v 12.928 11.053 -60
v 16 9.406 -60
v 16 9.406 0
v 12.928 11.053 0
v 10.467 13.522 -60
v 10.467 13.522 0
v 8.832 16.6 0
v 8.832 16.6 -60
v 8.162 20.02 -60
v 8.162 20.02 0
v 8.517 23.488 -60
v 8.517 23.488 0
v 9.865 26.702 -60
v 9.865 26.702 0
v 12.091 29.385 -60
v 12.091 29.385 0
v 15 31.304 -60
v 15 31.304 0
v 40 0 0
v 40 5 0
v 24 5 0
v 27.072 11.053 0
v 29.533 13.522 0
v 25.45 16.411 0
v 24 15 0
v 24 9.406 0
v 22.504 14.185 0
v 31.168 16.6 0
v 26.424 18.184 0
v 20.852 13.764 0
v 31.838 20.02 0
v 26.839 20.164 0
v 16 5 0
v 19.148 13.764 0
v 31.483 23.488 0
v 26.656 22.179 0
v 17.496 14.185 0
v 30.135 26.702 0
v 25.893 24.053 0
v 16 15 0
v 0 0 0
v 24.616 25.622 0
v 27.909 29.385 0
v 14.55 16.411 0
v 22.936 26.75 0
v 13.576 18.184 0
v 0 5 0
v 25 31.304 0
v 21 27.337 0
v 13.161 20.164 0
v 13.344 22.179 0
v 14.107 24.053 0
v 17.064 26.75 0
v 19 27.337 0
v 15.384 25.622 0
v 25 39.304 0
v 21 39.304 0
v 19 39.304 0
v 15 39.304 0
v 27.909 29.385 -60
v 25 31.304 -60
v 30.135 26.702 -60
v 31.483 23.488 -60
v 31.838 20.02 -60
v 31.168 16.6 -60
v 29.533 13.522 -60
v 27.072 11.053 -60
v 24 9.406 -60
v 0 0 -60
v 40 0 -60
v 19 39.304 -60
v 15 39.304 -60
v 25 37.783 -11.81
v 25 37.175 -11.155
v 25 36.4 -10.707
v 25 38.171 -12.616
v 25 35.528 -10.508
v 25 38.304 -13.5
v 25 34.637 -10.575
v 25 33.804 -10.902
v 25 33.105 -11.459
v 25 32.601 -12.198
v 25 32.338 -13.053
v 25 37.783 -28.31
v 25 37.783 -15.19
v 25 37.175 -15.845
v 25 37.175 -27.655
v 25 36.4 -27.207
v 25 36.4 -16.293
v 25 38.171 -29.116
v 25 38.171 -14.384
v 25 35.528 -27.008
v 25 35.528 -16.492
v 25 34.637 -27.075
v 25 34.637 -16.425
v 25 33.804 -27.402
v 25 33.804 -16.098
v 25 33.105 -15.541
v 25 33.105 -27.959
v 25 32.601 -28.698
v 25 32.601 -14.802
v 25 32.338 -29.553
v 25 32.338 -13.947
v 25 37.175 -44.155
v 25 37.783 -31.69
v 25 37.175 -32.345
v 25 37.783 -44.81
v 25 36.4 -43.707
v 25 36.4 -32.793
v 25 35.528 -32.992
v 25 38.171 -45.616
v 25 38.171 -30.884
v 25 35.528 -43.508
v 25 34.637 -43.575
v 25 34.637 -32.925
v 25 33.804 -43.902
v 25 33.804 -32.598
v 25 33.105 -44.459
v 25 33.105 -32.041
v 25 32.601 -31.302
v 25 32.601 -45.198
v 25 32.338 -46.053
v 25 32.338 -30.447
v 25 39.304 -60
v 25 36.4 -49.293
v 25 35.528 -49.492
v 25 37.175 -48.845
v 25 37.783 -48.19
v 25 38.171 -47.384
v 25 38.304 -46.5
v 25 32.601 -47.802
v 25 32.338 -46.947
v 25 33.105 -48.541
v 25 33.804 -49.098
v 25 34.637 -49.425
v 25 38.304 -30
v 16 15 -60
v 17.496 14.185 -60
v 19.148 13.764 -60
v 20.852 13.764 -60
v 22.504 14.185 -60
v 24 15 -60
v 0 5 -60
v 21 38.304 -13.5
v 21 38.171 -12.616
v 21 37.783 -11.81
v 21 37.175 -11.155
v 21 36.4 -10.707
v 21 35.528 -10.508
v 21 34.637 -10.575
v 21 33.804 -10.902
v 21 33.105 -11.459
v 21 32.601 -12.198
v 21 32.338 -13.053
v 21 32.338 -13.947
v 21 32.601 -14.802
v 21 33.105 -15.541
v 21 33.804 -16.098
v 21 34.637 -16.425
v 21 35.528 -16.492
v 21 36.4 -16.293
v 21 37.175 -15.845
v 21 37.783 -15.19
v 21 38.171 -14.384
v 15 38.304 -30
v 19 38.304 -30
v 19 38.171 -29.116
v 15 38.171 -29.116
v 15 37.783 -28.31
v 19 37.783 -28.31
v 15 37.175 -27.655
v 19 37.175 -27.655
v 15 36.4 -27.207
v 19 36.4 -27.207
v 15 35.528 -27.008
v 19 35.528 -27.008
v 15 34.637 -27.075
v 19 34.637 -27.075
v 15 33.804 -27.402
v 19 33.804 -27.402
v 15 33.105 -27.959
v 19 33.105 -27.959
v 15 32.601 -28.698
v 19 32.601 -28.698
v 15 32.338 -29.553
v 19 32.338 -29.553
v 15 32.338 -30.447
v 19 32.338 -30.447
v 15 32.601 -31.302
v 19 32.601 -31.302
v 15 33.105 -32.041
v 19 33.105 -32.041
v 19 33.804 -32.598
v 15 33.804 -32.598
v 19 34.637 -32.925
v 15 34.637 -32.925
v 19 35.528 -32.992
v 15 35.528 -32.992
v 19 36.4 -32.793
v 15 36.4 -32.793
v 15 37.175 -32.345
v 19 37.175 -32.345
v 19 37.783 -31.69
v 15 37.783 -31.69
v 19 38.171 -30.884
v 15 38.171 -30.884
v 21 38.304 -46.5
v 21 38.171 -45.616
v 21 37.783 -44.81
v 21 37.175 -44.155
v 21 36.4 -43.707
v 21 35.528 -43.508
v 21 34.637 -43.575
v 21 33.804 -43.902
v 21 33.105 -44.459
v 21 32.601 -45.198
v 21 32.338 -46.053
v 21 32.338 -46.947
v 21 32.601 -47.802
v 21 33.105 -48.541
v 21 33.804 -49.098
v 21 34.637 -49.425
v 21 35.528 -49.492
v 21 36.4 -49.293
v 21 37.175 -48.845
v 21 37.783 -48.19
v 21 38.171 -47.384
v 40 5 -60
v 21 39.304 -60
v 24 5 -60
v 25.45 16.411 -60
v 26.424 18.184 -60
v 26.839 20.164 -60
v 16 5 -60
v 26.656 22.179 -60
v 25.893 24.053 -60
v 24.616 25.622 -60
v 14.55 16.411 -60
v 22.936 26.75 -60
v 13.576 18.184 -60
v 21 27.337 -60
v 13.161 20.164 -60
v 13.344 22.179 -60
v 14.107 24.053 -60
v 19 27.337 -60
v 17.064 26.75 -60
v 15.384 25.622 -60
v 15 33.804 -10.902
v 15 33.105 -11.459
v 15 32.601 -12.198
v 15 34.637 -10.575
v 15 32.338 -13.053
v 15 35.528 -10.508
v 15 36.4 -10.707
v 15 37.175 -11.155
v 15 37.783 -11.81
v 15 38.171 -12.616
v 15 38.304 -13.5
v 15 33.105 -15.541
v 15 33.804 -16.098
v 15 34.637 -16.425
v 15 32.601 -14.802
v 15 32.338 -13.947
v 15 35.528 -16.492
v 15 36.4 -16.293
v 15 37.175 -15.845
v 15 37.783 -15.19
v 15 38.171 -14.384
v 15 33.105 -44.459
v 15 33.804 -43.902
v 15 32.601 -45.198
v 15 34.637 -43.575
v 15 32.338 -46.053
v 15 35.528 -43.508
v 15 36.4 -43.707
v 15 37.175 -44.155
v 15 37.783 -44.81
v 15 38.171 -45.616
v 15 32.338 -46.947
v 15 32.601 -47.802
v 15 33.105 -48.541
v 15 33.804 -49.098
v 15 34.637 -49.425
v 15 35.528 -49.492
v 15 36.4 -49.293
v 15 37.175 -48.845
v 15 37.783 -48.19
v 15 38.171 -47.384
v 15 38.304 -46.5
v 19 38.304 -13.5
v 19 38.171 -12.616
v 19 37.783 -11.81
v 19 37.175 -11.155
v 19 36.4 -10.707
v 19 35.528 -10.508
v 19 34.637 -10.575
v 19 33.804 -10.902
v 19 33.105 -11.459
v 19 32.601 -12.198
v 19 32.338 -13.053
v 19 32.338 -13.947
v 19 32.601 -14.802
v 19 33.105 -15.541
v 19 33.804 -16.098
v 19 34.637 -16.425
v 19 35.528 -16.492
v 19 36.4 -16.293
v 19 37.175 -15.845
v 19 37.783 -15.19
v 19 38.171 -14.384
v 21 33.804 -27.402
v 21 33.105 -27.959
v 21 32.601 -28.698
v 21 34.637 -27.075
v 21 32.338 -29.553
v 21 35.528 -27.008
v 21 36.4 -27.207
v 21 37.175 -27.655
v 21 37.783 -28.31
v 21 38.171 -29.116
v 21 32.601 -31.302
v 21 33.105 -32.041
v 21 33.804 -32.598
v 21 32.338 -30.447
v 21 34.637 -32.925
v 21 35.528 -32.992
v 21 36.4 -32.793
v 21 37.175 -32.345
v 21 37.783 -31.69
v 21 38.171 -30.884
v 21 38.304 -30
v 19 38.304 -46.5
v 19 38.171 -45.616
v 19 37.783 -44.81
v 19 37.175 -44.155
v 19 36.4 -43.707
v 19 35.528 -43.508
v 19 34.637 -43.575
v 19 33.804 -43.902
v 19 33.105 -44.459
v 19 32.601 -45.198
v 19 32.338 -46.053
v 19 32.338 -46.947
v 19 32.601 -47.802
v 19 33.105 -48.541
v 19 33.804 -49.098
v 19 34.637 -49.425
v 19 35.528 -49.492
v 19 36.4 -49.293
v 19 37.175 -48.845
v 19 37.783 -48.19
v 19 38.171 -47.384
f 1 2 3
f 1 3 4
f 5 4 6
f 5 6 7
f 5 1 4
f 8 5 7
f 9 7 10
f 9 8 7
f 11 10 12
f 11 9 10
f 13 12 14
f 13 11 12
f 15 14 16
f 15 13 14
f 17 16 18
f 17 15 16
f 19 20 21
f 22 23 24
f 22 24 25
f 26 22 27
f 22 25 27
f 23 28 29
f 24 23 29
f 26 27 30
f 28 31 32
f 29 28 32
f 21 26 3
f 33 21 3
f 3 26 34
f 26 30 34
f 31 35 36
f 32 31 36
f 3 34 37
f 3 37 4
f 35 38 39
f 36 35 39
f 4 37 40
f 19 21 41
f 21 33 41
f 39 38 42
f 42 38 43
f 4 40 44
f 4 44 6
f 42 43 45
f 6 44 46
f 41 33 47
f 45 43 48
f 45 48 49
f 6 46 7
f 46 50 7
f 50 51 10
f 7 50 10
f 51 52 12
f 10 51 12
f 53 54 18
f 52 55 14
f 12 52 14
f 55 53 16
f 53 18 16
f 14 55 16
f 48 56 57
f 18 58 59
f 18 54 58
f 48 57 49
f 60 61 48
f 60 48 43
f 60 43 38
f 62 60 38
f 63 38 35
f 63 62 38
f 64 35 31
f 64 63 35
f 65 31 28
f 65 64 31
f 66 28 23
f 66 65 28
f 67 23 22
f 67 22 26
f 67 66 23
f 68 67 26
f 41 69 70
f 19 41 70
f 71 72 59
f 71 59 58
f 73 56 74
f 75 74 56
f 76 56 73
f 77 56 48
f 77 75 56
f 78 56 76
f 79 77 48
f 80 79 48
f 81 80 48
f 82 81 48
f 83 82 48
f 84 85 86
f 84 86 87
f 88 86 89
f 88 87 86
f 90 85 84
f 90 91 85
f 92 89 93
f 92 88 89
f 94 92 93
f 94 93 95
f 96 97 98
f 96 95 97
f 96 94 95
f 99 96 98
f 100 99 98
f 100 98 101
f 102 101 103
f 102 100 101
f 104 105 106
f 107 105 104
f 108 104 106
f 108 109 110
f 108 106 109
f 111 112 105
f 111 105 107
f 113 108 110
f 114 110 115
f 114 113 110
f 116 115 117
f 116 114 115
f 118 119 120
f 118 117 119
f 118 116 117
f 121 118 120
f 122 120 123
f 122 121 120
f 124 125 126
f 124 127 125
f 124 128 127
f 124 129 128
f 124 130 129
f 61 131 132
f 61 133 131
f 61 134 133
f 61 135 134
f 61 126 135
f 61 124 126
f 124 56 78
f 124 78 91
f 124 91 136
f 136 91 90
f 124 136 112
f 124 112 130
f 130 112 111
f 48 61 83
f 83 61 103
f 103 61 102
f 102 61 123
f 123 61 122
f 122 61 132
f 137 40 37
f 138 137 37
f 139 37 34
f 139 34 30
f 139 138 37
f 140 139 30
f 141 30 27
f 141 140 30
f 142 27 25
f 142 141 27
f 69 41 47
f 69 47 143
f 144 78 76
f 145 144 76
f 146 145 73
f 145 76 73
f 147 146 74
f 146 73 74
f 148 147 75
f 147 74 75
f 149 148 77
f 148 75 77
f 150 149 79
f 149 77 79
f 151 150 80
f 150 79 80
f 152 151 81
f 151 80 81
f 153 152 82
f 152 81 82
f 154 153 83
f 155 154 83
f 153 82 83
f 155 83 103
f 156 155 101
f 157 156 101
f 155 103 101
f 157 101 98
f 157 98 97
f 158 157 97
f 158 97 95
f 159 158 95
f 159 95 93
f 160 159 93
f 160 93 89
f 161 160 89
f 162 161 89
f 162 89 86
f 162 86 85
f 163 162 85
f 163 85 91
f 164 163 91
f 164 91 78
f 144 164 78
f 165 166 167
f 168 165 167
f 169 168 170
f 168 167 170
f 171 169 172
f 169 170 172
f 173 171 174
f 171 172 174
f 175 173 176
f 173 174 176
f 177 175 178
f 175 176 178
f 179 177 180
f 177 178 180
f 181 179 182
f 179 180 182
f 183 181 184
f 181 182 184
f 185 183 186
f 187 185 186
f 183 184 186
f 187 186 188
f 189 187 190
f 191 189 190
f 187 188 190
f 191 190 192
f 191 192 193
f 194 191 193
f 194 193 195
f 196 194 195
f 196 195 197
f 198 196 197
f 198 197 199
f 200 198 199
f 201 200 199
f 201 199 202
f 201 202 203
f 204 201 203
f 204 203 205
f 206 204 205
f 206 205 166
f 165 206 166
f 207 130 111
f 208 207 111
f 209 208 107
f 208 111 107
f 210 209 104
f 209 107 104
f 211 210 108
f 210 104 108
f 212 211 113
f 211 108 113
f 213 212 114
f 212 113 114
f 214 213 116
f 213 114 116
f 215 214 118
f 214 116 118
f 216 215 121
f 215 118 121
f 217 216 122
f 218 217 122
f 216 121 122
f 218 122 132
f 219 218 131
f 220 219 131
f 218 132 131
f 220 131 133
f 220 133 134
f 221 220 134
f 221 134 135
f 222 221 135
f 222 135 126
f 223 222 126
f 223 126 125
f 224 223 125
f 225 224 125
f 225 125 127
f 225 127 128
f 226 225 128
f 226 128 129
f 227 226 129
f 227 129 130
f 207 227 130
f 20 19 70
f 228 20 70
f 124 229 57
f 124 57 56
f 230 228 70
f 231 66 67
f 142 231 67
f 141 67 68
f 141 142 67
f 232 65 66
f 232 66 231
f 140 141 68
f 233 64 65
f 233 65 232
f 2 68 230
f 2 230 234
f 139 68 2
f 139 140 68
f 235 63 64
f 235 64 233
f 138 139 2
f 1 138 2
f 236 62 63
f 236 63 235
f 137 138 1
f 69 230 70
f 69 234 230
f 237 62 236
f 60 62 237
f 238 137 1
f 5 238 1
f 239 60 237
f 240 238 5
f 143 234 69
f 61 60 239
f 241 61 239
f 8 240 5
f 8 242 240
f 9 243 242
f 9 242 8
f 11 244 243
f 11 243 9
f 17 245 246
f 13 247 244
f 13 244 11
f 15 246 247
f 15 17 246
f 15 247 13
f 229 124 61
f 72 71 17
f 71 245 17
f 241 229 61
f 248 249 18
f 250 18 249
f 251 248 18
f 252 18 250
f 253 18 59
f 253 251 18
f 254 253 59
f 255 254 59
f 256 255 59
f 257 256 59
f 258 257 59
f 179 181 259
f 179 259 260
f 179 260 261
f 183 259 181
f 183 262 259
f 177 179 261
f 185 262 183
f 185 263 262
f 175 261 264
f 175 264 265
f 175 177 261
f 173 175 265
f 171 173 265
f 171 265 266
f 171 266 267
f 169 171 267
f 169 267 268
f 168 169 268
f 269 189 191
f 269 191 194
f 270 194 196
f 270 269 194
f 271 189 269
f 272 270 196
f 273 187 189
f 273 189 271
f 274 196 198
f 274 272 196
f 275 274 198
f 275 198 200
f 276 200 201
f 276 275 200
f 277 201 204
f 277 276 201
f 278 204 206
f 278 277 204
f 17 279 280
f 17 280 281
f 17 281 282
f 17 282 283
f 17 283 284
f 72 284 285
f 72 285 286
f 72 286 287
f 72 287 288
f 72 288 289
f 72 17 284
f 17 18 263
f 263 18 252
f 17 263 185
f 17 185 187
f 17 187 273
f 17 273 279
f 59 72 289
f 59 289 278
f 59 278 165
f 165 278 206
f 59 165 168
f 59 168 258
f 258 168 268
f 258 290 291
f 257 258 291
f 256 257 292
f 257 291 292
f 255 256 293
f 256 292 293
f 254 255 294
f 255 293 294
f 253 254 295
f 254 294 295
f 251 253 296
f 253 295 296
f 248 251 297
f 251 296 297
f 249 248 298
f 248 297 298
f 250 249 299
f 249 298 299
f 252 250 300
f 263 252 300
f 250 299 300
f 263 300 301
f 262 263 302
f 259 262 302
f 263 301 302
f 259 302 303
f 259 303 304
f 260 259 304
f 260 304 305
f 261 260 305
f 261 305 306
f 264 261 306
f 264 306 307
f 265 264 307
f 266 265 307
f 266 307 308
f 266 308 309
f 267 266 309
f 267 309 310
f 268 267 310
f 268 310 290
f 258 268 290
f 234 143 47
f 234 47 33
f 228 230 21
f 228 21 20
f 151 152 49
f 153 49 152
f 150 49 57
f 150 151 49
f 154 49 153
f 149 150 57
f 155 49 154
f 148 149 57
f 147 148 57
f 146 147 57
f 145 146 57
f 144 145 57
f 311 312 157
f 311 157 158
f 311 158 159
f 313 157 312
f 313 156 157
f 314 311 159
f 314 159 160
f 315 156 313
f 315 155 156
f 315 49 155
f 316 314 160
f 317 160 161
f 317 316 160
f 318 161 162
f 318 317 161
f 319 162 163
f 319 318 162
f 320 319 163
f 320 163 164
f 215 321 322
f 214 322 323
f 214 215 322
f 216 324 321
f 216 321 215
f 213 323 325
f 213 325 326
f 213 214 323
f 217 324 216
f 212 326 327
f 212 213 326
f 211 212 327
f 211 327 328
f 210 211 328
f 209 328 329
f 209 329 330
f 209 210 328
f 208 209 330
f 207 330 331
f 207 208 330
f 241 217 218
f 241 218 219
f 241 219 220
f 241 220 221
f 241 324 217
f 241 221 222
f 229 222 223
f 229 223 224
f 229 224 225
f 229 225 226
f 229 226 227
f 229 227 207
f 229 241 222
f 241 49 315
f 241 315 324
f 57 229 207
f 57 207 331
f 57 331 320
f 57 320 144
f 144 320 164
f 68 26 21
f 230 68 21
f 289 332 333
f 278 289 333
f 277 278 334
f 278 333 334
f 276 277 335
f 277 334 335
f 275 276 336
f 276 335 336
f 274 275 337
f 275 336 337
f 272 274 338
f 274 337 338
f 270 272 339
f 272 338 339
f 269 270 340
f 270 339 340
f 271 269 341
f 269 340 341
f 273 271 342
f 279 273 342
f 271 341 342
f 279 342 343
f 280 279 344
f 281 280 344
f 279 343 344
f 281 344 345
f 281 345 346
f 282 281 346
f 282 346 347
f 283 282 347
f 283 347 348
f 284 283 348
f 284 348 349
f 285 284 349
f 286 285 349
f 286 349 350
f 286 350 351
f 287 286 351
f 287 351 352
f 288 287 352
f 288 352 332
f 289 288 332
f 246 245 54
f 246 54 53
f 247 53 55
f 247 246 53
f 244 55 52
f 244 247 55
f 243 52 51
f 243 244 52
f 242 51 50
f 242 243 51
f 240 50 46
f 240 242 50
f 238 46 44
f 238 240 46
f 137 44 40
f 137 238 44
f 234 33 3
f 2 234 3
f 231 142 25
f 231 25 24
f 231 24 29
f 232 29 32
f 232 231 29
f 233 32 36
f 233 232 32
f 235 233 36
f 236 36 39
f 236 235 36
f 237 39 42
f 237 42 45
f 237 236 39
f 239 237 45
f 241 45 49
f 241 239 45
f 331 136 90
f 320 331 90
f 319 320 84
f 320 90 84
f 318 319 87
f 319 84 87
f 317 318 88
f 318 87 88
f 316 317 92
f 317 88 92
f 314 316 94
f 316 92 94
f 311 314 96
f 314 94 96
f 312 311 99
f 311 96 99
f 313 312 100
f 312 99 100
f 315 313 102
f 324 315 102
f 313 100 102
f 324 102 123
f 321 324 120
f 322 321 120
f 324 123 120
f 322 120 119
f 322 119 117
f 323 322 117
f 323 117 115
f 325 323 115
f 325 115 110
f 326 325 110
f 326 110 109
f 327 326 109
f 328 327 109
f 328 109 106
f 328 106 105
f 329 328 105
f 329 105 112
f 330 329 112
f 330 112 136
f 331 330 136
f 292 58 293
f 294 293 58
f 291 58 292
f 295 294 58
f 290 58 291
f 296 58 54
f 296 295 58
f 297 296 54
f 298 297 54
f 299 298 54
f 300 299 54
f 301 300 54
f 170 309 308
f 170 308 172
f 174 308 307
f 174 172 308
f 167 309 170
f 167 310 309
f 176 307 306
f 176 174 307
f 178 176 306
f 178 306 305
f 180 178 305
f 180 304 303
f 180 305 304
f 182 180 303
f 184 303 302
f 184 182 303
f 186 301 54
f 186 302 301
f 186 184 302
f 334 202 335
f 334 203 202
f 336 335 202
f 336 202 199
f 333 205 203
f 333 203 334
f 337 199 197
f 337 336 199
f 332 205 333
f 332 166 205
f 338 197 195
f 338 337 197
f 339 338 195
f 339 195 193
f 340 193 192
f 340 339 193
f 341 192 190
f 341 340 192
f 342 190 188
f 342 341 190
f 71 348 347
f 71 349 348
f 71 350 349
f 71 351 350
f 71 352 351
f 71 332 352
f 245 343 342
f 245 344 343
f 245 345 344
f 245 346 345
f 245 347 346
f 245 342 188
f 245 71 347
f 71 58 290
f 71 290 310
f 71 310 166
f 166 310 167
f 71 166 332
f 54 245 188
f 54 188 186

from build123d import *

# Parameters (mm, degrees)
ESQUISSE1_W             = 40
ESQUISSE1_H             = 60
BOSS_EXTRU_1_DEPTH      = 5
BOSS_EXTRU_3_DEPTH      = 60
BOSS_EXTRU_5_START      = -60
BOSS_EXTRU_5_DEPTH      = 60
ESQUISSE5_R             = 3
ENL_V_MAT_EXTRU_1_DEPTH = 76.959376992


with BuildPart() as part:
    # Esquisse1 → Boss.-Extru.1 (new body)
    with BuildSketch(Plane(origin=(0, 0, 0), x_dir=(1, 0, 0), z_dir=(0, 1, 0))):
        with Locations((20, 30)):
            Rectangle(ESQUISSE1_W, ESQUISSE1_H)
    extrude(amount=BOSS_EXTRU_1_DEPTH)

    # Esquisse3 → Boss.-Extru.3 (add)
    with BuildSketch(Plane.XY.offset(-60)):
        with BuildLine():
            Line((16, 5), (16, 15))
            ThreePointArc((16, 15), (20, 13.710800302), (24, 15))
            Line((24, 15), (24, 5))
            Line((24, 5), (16, 5))
        make_face()
    extrude(amount=BOSS_EXTRU_3_DEPTH)

    # Esquisse4 → Boss.-Extru.5 (add)
    with BuildSketch(Plane.XY.offset(BOSS_EXTRU_5_START)):
        with BuildLine():
            Line((15, 31.304286701), (15, 39.304286701))
            Line((15, 39.304286701), (19, 39.304286701))
            Line((19, 39.304286701), (19, 27.337414501))
            ThreePointArc((19, 27.337414501), (20, 13.710800302), (21, 27.337414501))
            Line((21, 27.337414501), (21, 39.304286701))
            Line((21, 39.304286701), (25, 39.304286701))
            Line((25, 39.304286701), (25, 31.304286701))
            ThreePointArc((25, 31.304286701), (20, 8.710800302), (15, 31.304286701))
        make_face()
    extrude(amount=BOSS_EXTRU_5_DEPTH)

    # Esquisse5 → Enlèv. mat.-Extru.1 (cut, through all)
    with BuildSketch(Plane(origin=(25, 0, 0), x_dir=(0, 0, -1), z_dir=(1, 0, 0))):
        with Locations(Location((13.5, 35.304286701, 0), (0, 0, 90))):
            Circle(ESQUISSE5_R)
        with Locations(Location((30, 35.304286701, 0), (0, 0, 90))):
            Circle(ESQUISSE5_R)
        with Locations(Location((46.5, 35.304286701, 0), (0, 0, 90))):
            Circle(ESQUISSE5_R)
    extrude(amount=-ENL_V_MAT_EXTRU_1_DEPTH, mode=Mode.SUBTRACT)


solid = part.part
